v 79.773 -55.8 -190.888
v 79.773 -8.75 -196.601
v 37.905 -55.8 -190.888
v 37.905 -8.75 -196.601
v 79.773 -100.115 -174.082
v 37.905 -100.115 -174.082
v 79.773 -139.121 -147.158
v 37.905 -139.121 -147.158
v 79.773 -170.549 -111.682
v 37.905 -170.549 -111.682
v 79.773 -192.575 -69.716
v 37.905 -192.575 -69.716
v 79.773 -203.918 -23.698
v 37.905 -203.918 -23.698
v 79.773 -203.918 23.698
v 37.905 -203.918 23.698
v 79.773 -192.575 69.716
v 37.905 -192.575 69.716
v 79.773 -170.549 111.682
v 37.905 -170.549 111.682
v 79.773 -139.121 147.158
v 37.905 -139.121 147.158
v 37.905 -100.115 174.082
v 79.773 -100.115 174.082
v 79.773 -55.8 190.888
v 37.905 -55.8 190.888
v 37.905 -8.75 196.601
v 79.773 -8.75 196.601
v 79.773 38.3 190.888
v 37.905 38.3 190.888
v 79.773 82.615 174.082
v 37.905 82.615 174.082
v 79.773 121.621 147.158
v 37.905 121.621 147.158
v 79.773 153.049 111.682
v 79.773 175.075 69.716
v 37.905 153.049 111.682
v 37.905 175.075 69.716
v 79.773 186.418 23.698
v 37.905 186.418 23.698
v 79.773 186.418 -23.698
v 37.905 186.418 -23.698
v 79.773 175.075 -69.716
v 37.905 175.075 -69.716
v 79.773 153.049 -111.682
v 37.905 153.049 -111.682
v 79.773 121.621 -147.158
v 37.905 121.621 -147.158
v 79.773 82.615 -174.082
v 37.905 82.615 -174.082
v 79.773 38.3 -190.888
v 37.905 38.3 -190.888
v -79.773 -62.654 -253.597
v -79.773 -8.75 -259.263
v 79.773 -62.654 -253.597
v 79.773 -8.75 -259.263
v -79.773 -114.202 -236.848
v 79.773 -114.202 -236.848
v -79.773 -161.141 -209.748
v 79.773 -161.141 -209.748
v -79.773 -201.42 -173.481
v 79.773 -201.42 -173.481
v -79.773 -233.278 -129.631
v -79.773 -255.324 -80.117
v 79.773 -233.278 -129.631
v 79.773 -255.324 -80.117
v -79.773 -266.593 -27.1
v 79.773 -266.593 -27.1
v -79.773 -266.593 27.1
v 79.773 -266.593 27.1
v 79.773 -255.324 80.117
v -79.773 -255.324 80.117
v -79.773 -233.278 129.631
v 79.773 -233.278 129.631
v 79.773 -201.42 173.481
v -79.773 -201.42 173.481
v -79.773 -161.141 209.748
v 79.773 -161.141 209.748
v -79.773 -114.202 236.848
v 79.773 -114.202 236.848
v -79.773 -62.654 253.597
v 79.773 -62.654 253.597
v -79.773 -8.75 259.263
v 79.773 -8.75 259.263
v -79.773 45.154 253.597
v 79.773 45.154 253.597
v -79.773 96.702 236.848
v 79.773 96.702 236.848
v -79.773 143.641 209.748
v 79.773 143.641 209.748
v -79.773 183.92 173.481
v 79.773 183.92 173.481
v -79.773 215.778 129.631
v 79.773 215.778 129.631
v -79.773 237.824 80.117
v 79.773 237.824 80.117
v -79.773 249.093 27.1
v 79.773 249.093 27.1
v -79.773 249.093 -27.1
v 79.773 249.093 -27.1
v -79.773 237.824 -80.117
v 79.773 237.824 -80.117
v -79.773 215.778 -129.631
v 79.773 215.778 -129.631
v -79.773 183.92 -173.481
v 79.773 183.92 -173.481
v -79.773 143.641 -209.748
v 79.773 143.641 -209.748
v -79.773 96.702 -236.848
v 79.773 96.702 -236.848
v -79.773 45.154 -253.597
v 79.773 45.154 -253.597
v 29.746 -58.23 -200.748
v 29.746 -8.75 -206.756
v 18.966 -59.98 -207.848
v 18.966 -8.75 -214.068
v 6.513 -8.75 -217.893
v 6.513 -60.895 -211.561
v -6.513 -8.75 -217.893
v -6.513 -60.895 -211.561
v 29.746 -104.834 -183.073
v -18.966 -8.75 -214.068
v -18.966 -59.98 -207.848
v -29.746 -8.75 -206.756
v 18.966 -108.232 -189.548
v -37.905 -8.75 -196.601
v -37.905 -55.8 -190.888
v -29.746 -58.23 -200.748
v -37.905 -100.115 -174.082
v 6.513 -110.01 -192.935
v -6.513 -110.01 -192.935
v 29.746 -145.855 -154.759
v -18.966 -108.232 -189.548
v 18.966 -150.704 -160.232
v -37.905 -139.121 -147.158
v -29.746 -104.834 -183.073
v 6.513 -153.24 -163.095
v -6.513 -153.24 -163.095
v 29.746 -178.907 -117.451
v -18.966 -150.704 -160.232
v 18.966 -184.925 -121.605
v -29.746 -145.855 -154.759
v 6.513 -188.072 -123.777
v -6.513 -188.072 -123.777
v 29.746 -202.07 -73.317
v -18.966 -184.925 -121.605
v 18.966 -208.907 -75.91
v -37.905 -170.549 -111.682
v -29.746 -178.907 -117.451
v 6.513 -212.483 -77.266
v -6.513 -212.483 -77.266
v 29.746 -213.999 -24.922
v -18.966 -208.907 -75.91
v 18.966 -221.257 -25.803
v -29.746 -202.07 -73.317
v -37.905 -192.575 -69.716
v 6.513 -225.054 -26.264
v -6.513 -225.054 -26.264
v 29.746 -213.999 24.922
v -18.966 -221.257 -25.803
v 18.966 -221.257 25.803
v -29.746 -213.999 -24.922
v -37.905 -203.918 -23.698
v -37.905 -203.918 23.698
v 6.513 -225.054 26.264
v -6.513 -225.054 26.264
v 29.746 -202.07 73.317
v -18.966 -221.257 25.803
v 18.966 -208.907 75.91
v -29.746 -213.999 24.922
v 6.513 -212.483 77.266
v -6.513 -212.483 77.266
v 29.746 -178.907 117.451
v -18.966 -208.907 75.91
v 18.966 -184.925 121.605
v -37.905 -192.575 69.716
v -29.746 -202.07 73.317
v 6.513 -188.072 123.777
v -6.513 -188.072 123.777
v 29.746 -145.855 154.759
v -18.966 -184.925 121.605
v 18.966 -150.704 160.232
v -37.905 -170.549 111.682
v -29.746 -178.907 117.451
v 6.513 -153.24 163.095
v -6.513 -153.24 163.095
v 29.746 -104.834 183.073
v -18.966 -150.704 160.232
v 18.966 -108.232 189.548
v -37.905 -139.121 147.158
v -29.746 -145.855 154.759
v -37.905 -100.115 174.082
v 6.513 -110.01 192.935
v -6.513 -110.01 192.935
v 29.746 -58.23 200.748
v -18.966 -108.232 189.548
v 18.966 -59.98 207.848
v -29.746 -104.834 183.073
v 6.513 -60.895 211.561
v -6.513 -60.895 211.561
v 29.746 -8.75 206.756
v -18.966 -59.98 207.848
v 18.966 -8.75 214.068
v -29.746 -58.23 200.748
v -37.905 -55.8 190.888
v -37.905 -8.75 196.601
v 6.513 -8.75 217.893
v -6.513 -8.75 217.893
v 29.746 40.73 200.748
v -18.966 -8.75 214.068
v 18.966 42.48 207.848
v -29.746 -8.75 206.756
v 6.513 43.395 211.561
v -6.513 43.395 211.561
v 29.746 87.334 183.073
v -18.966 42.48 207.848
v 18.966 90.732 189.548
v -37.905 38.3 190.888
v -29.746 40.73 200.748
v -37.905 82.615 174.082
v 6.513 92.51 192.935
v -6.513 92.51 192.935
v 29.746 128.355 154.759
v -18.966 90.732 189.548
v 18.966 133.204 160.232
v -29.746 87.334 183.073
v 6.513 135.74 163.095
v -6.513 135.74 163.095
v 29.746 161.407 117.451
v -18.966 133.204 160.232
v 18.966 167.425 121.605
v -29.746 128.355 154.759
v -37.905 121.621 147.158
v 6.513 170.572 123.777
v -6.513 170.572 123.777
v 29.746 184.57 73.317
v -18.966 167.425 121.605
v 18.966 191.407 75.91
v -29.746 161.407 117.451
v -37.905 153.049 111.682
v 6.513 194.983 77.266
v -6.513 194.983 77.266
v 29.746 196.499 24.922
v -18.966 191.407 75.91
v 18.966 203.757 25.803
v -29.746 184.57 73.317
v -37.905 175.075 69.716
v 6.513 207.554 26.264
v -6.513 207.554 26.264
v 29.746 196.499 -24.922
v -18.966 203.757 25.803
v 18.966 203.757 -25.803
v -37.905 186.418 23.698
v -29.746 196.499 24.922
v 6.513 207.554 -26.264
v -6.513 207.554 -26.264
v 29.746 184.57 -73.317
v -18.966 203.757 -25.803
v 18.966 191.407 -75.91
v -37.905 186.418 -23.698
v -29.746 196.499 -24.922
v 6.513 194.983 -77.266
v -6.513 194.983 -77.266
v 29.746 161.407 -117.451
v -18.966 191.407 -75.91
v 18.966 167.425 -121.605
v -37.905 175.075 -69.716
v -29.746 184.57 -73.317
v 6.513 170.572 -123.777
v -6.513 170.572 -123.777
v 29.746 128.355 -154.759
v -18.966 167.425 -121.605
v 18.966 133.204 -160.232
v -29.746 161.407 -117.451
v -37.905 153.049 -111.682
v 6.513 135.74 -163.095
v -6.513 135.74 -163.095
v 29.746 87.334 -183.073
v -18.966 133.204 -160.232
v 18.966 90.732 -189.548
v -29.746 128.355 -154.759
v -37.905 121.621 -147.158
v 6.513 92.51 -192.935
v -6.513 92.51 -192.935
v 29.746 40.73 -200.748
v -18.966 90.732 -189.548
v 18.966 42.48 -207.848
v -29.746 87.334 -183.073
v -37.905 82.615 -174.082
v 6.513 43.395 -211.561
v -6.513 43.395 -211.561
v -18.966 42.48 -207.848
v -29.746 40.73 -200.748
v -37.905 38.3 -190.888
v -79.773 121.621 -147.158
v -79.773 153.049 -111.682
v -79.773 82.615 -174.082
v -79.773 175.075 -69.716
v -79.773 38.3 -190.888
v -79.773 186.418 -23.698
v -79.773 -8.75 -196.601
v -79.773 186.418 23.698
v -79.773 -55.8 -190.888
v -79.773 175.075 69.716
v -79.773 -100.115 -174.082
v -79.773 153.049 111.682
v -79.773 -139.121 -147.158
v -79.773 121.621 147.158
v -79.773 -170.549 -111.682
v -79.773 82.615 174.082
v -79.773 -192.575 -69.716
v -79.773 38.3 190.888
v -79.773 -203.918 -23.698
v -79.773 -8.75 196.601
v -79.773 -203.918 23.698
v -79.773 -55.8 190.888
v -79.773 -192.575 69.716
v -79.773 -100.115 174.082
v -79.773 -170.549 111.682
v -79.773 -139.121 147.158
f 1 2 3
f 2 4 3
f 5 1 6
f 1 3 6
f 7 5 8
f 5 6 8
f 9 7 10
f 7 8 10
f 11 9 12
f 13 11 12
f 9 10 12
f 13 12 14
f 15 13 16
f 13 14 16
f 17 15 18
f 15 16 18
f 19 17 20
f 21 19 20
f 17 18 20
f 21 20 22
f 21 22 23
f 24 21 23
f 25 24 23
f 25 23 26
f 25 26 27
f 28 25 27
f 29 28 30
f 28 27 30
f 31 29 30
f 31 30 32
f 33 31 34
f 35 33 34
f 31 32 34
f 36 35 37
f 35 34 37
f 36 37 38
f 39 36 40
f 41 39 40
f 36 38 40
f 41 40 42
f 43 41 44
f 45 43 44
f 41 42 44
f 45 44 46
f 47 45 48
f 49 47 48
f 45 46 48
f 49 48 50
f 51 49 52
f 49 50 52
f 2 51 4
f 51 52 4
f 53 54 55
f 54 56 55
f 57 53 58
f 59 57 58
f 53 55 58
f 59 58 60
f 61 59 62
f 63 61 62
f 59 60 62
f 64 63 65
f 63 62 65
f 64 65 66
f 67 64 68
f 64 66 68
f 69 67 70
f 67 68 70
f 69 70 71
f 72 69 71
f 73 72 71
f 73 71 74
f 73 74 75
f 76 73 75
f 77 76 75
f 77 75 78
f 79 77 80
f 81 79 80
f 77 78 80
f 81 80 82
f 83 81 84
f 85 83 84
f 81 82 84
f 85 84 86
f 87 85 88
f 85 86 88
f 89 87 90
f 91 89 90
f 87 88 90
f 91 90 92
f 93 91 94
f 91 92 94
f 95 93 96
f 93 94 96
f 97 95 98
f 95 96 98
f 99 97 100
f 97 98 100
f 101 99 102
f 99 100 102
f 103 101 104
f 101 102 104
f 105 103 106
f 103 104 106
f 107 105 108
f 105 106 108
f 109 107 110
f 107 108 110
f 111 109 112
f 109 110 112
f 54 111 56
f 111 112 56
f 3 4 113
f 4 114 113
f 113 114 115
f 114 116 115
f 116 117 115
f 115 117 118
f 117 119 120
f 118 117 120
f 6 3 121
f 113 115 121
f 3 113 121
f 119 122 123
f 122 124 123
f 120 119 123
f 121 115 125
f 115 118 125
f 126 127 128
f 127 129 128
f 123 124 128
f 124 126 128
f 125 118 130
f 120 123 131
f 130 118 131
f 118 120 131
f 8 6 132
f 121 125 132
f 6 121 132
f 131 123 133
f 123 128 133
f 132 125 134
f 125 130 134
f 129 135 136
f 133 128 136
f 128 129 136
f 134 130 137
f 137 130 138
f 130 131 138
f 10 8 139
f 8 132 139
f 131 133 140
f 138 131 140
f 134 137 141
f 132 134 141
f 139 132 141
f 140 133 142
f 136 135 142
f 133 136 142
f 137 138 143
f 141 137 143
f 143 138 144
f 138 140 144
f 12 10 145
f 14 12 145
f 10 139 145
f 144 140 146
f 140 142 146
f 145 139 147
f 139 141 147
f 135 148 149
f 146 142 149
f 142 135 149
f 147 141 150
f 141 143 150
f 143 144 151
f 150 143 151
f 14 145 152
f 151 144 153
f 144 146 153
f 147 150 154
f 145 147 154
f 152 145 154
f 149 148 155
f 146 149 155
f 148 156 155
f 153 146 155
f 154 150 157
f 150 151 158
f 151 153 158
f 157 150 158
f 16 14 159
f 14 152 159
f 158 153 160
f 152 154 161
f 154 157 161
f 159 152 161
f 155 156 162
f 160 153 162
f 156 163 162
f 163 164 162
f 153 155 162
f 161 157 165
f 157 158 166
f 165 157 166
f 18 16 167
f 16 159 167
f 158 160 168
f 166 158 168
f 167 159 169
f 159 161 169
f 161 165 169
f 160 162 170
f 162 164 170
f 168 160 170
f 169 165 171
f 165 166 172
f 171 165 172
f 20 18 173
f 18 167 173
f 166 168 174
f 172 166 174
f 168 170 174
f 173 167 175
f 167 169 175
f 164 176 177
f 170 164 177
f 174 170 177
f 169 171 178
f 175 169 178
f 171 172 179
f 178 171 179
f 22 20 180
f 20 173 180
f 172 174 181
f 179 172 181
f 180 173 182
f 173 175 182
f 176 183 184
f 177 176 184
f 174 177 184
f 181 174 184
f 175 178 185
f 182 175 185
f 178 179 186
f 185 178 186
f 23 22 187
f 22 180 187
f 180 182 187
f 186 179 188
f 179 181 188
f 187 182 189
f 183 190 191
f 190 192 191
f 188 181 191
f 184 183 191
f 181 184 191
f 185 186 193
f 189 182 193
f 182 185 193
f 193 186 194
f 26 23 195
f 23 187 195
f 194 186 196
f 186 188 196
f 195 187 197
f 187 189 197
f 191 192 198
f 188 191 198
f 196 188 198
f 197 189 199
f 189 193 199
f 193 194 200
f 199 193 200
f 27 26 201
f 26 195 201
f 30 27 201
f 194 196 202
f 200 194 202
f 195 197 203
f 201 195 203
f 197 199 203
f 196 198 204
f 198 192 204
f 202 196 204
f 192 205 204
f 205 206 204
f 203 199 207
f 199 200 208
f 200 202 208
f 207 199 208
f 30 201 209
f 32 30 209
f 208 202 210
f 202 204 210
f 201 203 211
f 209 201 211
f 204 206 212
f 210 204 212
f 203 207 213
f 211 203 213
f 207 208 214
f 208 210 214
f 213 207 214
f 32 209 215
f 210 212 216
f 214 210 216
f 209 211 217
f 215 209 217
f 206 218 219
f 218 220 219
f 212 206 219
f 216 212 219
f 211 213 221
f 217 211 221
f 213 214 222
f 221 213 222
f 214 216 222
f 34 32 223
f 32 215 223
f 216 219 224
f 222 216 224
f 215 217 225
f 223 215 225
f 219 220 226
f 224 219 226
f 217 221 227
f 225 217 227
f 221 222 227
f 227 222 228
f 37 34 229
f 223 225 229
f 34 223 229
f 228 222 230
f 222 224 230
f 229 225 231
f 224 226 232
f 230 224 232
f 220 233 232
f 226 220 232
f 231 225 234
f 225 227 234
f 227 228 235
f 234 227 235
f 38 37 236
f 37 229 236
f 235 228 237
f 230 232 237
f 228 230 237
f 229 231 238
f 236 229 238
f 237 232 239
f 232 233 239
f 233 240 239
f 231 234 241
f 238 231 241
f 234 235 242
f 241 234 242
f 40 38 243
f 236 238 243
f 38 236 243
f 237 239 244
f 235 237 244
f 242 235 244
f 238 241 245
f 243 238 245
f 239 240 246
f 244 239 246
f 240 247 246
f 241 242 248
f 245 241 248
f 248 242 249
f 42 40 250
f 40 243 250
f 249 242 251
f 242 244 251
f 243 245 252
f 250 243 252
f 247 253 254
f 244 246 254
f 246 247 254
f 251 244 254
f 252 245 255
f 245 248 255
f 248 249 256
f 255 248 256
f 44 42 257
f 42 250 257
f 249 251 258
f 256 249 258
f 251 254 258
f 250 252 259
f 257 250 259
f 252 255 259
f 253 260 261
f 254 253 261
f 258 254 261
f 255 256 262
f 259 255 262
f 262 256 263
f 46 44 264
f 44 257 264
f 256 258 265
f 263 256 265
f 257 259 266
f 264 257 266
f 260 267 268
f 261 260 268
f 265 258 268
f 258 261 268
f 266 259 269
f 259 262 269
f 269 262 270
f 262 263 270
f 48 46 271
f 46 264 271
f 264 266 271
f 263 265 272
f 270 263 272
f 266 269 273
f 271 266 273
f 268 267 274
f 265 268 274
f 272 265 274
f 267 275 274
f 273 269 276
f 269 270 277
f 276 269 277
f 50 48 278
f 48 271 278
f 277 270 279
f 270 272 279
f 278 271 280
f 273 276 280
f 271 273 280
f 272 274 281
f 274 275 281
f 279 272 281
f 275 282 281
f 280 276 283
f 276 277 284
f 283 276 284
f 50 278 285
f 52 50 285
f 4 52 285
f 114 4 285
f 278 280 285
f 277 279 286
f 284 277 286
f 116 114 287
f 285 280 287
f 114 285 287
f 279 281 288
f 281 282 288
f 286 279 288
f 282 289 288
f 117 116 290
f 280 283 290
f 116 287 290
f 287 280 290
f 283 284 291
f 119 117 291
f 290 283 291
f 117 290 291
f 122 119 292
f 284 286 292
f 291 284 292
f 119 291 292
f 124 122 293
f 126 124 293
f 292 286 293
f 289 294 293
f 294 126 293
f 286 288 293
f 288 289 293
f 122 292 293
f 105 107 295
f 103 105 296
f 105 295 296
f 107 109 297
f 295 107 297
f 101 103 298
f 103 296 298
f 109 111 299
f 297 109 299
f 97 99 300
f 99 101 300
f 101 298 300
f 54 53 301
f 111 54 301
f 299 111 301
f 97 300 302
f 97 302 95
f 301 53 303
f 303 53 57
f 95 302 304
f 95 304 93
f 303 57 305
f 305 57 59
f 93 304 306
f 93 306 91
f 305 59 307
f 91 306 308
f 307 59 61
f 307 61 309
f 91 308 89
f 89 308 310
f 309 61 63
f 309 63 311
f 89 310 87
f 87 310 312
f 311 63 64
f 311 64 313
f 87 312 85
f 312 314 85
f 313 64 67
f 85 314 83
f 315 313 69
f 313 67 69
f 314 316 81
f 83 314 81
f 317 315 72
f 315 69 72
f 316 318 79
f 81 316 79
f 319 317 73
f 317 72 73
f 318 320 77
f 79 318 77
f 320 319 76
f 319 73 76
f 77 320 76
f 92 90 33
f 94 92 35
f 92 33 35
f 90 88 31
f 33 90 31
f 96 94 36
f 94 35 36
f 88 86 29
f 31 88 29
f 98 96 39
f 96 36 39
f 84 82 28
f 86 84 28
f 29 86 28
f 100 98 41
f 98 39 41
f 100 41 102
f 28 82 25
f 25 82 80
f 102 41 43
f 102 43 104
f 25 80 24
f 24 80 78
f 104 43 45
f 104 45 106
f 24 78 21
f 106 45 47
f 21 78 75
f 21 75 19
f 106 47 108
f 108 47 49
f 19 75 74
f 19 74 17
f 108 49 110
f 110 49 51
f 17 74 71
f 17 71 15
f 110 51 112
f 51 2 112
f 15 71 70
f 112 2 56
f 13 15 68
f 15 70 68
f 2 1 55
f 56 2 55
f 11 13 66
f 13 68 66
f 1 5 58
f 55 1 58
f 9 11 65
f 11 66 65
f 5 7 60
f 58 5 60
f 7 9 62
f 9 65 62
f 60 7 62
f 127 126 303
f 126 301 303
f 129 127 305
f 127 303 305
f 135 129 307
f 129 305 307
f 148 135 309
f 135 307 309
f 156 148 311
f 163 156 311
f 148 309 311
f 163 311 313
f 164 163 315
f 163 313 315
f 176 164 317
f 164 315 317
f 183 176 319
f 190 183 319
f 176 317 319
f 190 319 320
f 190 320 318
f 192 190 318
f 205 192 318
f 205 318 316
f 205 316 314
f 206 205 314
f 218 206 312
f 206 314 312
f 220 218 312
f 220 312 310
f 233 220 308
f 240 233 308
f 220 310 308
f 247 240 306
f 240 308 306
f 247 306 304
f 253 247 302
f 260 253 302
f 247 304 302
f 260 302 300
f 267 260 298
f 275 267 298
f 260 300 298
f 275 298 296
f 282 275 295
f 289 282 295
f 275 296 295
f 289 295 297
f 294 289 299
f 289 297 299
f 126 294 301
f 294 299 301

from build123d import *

# Parameters (mm, degrees)
SCALE2_SCALE = 6
SCALE3_SCALE = 3.323882225


with BuildPart() as part:
    # Sketch1 → Revolve1 (revolve)
    with BuildSketch(Plane.XY, mode=Mode.PRIVATE) as revolve1_sk:
        with BuildLine():
            Line((0, 4.25), (4, 4.25))
            Line((4, 4.25), (4, 1.108))
            Line((4, 1.108), (1.900614637, 1.108))
            ThreePointArc((1.900614637, 1.108), (0, 2.2), (-1.900614637, 1.108))
            Line((-1.900614637, 1.108), (-4, 1.108))
            Line((-4, 1.108), (-4, 4.25))
            Line((-4, 4.25), (0, 4.25))
        make_face()
    revolve(revolve1_sk.sketch.rotate(Axis((4, -8.75, 0), (-1, 0, 0)), 90), axis=Axis((4, -8.75, 0), (-1, 0, 0)))


with BuildPart() as part_1:
    # Scale2: scaled about (0, -8.75, 0)
    add(part.part.scale(SCALE2_SCALE).moved(Location((0, 43.75, 0))))


with BuildPart() as part_2:
    # Scale3: scaled about (0, -8.75, 0)
    add(part_1.part.scale(SCALE3_SCALE).moved(Location((0, 20.333969466, 0))))


solid = part_2.part
